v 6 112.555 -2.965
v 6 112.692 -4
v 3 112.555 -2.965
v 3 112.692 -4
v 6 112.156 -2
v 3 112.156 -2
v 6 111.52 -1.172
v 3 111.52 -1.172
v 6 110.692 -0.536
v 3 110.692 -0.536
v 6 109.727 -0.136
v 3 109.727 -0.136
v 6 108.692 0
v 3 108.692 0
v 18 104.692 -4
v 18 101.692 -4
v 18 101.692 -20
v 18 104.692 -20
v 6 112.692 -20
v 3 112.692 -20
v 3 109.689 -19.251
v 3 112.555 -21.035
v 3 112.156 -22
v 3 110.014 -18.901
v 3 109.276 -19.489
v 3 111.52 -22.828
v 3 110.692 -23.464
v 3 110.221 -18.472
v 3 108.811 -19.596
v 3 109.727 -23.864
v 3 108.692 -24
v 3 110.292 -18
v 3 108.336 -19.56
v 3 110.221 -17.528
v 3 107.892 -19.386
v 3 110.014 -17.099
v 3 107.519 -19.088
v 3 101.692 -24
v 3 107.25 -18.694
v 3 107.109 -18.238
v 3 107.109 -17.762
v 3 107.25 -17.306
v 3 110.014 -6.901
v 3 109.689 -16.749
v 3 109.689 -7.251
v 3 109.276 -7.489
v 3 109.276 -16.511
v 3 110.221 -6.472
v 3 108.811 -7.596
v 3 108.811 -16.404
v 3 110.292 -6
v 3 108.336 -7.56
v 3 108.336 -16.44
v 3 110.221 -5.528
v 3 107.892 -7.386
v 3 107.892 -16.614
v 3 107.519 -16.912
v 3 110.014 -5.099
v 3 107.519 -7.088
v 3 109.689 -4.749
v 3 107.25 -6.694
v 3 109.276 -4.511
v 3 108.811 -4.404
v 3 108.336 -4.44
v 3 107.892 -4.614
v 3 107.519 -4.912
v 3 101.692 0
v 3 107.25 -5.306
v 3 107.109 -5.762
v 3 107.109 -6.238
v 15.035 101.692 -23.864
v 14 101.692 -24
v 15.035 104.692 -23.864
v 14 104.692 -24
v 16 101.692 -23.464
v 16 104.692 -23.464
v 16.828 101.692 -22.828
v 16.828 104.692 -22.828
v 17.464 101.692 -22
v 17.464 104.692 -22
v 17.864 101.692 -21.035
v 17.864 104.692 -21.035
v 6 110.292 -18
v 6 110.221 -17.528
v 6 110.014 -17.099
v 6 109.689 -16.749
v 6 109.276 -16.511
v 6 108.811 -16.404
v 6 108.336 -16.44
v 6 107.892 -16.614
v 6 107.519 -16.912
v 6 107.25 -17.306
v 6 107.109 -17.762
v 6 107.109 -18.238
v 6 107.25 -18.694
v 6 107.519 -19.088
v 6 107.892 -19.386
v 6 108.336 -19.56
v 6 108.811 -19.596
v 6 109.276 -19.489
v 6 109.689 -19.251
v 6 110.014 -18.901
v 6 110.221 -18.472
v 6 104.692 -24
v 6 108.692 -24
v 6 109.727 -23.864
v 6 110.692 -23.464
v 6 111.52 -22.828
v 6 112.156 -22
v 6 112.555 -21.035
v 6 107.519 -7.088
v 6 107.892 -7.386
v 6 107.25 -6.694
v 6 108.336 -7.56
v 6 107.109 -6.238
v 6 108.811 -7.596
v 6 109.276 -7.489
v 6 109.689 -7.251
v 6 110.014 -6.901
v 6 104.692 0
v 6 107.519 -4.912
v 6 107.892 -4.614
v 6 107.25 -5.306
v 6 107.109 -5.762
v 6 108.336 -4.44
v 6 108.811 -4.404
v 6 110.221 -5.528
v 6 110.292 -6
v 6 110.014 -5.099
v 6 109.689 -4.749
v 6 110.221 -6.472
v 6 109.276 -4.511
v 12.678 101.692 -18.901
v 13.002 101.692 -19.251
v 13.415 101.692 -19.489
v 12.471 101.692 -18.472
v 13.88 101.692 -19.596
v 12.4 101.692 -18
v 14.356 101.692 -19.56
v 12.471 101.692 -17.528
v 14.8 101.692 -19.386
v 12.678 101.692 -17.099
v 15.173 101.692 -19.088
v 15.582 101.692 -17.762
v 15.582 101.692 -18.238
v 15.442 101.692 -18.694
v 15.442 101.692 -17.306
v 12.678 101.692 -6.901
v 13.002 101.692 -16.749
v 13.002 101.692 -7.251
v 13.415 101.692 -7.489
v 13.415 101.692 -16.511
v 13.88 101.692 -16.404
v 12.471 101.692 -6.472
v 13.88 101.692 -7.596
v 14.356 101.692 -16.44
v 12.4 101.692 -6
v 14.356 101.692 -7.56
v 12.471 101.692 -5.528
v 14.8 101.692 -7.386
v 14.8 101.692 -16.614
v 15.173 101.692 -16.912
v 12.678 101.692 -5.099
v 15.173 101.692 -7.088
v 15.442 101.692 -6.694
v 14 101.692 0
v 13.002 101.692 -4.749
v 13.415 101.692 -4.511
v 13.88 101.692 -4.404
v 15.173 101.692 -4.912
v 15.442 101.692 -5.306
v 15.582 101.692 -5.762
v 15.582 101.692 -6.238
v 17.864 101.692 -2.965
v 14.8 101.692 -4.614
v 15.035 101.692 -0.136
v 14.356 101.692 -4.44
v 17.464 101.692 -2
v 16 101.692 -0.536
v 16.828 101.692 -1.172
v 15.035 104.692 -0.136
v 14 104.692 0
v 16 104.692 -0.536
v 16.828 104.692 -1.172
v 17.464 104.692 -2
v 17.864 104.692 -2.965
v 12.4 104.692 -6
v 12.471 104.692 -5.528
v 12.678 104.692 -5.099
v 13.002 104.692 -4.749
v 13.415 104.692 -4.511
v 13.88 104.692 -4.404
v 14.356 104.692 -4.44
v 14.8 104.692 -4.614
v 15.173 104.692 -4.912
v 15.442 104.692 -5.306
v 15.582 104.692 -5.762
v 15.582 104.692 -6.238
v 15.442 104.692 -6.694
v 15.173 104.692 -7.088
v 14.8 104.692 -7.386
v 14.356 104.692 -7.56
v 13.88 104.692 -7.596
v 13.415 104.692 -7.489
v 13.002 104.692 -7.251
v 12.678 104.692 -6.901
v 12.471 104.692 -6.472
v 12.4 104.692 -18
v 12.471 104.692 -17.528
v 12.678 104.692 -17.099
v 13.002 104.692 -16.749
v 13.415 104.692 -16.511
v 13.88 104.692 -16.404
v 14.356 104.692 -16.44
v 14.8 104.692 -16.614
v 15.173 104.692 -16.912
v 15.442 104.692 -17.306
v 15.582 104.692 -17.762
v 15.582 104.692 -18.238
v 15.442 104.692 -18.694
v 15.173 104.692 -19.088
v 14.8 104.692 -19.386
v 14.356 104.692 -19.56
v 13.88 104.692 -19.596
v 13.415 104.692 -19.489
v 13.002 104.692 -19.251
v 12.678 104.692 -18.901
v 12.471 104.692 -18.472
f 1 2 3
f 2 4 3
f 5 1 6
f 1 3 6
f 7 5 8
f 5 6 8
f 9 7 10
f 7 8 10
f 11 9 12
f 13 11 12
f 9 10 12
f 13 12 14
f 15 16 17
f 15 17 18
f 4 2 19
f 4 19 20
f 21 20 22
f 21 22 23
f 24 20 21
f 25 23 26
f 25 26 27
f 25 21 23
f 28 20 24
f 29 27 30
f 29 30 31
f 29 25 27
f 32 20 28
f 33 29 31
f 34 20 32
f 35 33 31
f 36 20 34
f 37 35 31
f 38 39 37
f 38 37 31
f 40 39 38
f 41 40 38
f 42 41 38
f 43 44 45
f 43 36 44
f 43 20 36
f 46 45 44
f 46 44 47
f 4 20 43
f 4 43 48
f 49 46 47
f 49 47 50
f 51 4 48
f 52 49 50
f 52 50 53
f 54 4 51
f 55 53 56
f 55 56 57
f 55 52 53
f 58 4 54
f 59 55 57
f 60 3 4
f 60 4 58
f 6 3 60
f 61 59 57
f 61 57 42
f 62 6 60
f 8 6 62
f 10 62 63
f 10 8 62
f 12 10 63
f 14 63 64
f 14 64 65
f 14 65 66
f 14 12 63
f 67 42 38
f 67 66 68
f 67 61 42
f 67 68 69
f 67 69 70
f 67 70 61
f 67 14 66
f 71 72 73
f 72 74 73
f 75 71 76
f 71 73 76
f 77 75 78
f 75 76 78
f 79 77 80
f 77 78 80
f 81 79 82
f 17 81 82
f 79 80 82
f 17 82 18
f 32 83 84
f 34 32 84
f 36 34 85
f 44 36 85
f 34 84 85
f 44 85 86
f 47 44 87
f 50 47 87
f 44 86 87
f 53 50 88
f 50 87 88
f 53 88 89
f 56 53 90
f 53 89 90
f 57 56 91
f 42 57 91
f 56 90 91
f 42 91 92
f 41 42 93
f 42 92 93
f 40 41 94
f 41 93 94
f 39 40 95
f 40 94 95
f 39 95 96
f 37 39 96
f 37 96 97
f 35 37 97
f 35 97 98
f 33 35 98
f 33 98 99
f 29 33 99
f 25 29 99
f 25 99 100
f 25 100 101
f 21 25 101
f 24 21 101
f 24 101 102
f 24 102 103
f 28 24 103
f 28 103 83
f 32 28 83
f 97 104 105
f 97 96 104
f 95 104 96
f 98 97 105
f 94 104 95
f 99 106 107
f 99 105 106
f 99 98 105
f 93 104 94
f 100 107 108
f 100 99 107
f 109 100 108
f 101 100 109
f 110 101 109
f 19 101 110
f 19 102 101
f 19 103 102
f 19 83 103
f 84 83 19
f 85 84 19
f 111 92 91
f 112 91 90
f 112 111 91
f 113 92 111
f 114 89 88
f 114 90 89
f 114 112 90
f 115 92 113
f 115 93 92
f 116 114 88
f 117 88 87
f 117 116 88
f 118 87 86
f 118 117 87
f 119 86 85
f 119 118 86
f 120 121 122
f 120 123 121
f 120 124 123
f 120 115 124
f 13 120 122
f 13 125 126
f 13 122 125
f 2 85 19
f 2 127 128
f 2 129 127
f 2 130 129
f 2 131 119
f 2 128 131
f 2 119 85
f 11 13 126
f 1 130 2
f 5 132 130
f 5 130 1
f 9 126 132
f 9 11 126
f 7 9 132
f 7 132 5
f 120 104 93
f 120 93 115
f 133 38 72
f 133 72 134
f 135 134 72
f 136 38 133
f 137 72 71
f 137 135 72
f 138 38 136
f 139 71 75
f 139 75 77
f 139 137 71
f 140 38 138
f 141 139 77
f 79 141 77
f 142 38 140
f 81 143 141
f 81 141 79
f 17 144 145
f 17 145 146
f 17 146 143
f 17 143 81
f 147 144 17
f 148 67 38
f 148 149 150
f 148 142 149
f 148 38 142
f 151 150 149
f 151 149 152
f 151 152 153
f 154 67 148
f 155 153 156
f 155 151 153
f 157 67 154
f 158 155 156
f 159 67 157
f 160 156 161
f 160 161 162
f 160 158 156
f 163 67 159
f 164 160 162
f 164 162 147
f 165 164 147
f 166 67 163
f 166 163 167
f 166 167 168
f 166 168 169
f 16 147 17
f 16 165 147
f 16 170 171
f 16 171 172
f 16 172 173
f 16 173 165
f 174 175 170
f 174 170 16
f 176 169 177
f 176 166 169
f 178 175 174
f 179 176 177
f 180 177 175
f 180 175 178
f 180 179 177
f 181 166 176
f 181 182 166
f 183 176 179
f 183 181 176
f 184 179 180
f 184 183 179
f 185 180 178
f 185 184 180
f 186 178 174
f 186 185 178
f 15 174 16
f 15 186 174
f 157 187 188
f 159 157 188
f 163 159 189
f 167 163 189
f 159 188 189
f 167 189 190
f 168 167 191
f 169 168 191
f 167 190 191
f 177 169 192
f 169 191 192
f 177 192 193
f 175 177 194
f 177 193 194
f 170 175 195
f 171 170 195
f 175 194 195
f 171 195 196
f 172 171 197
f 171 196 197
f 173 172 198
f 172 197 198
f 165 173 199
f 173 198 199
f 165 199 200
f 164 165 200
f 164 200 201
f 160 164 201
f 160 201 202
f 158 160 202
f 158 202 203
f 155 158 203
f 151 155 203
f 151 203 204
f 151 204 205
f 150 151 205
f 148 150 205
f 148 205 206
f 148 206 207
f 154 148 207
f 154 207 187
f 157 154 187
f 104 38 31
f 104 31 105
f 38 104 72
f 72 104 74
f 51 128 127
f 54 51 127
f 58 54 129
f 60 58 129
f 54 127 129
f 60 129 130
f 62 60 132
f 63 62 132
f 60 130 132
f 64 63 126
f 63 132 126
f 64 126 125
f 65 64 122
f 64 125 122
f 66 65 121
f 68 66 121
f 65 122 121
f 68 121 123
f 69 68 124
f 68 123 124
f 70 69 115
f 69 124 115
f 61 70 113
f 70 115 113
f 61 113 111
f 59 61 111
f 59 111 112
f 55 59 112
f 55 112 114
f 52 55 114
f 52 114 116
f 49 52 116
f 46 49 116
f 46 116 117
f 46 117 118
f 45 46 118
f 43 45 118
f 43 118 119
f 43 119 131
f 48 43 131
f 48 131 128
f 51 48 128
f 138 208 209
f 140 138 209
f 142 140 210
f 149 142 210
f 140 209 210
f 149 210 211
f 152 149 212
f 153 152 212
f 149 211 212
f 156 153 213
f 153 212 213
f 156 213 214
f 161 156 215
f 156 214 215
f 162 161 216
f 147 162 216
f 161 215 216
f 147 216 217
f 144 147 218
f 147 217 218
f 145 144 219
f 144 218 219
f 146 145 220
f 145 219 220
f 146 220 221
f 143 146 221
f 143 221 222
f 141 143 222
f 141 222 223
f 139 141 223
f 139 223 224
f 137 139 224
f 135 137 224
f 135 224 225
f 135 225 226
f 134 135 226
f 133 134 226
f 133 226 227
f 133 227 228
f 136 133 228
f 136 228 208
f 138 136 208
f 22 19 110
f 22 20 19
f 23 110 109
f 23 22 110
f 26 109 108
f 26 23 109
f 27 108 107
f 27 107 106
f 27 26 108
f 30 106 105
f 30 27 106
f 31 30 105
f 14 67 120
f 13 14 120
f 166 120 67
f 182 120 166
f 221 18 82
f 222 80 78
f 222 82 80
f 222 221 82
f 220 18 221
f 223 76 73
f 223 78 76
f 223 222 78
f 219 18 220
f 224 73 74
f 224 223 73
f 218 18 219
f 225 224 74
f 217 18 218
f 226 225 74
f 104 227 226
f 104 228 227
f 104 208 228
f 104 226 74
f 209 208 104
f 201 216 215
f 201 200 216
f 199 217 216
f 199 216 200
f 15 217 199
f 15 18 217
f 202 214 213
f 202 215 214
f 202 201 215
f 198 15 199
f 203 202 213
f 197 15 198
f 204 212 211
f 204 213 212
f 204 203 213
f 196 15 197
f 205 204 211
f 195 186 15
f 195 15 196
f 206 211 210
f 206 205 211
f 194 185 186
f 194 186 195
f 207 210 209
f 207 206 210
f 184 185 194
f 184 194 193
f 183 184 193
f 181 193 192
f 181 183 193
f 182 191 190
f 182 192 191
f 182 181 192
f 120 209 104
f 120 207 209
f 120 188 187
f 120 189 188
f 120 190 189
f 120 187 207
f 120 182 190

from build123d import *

# Parameters (mm, degrees)
EXTRUDE_1_DEPTH     = 24
SKETCH_2_R          = 1.6
CUT_EXTRUDE_1_DEPTH = 24
SKETCH_3_R          = 1.6
CUT_EXTRUDE_2_DEPTH = 24
FILLET_1_R          = 4


with BuildPart() as part:
    # 草图1 → 凸台-拉伸1 (new body)
    with BuildSketch(Plane.XY):
        Polygon((6, 112.691622655), (3, 112.691622655), (3, 101.691622655), (18, 101.691622655), (18, 104.691622655), (6, 104.691622655), align=None)
    extrude(amount=-EXTRUDE_1_DEPTH)

    # 草图2 → 切除-拉伸1 (cut)
    with BuildSketch(Plane(origin=(6, 0, 0), x_dir=(0, 0, -1), z_dir=(1, 0, 0))):
        with Locations(Location((6, 108.691622655, 0), (0, 0, 90))):
            Circle(SKETCH_2_R)
        with Locations(Location((18, 108.691622655, 0), (0, 0, 90))):
            Circle(SKETCH_2_R)
    extrude(amount=-CUT_EXTRUDE_1_DEPTH, mode=Mode.SUBTRACT)

    # 草图3 → 切除-拉伸2 (cut)
    with BuildSketch(Plane(origin=(0, 104.691622655, 0), x_dir=(1, 0, 0), z_dir=(0, 1, 0))):
        with Locations(Location((14, 6, 0), (0, 0, 180))):
            Circle(SKETCH_3_R)
        with Locations(Location((14, 18, 0), (0, 0, 180))):
            Circle(SKETCH_3_R)
    extrude(amount=-CUT_EXTRUDE_2_DEPTH, mode=Mode.SUBTRACT)

    # 圆角1
    fillet_1_edges = [part.edges().sort_by_distance(p)[0] for p in [
        (4.5, 112.691622655, -24),
        (4.5, 112.691622655, 0),
        (18, 103.191622655, -24),
        (18, 103.191622655, 0),
    ]]
    fillet(fillet_1_edges, radius=FILLET_1_R)


solid = part.part
